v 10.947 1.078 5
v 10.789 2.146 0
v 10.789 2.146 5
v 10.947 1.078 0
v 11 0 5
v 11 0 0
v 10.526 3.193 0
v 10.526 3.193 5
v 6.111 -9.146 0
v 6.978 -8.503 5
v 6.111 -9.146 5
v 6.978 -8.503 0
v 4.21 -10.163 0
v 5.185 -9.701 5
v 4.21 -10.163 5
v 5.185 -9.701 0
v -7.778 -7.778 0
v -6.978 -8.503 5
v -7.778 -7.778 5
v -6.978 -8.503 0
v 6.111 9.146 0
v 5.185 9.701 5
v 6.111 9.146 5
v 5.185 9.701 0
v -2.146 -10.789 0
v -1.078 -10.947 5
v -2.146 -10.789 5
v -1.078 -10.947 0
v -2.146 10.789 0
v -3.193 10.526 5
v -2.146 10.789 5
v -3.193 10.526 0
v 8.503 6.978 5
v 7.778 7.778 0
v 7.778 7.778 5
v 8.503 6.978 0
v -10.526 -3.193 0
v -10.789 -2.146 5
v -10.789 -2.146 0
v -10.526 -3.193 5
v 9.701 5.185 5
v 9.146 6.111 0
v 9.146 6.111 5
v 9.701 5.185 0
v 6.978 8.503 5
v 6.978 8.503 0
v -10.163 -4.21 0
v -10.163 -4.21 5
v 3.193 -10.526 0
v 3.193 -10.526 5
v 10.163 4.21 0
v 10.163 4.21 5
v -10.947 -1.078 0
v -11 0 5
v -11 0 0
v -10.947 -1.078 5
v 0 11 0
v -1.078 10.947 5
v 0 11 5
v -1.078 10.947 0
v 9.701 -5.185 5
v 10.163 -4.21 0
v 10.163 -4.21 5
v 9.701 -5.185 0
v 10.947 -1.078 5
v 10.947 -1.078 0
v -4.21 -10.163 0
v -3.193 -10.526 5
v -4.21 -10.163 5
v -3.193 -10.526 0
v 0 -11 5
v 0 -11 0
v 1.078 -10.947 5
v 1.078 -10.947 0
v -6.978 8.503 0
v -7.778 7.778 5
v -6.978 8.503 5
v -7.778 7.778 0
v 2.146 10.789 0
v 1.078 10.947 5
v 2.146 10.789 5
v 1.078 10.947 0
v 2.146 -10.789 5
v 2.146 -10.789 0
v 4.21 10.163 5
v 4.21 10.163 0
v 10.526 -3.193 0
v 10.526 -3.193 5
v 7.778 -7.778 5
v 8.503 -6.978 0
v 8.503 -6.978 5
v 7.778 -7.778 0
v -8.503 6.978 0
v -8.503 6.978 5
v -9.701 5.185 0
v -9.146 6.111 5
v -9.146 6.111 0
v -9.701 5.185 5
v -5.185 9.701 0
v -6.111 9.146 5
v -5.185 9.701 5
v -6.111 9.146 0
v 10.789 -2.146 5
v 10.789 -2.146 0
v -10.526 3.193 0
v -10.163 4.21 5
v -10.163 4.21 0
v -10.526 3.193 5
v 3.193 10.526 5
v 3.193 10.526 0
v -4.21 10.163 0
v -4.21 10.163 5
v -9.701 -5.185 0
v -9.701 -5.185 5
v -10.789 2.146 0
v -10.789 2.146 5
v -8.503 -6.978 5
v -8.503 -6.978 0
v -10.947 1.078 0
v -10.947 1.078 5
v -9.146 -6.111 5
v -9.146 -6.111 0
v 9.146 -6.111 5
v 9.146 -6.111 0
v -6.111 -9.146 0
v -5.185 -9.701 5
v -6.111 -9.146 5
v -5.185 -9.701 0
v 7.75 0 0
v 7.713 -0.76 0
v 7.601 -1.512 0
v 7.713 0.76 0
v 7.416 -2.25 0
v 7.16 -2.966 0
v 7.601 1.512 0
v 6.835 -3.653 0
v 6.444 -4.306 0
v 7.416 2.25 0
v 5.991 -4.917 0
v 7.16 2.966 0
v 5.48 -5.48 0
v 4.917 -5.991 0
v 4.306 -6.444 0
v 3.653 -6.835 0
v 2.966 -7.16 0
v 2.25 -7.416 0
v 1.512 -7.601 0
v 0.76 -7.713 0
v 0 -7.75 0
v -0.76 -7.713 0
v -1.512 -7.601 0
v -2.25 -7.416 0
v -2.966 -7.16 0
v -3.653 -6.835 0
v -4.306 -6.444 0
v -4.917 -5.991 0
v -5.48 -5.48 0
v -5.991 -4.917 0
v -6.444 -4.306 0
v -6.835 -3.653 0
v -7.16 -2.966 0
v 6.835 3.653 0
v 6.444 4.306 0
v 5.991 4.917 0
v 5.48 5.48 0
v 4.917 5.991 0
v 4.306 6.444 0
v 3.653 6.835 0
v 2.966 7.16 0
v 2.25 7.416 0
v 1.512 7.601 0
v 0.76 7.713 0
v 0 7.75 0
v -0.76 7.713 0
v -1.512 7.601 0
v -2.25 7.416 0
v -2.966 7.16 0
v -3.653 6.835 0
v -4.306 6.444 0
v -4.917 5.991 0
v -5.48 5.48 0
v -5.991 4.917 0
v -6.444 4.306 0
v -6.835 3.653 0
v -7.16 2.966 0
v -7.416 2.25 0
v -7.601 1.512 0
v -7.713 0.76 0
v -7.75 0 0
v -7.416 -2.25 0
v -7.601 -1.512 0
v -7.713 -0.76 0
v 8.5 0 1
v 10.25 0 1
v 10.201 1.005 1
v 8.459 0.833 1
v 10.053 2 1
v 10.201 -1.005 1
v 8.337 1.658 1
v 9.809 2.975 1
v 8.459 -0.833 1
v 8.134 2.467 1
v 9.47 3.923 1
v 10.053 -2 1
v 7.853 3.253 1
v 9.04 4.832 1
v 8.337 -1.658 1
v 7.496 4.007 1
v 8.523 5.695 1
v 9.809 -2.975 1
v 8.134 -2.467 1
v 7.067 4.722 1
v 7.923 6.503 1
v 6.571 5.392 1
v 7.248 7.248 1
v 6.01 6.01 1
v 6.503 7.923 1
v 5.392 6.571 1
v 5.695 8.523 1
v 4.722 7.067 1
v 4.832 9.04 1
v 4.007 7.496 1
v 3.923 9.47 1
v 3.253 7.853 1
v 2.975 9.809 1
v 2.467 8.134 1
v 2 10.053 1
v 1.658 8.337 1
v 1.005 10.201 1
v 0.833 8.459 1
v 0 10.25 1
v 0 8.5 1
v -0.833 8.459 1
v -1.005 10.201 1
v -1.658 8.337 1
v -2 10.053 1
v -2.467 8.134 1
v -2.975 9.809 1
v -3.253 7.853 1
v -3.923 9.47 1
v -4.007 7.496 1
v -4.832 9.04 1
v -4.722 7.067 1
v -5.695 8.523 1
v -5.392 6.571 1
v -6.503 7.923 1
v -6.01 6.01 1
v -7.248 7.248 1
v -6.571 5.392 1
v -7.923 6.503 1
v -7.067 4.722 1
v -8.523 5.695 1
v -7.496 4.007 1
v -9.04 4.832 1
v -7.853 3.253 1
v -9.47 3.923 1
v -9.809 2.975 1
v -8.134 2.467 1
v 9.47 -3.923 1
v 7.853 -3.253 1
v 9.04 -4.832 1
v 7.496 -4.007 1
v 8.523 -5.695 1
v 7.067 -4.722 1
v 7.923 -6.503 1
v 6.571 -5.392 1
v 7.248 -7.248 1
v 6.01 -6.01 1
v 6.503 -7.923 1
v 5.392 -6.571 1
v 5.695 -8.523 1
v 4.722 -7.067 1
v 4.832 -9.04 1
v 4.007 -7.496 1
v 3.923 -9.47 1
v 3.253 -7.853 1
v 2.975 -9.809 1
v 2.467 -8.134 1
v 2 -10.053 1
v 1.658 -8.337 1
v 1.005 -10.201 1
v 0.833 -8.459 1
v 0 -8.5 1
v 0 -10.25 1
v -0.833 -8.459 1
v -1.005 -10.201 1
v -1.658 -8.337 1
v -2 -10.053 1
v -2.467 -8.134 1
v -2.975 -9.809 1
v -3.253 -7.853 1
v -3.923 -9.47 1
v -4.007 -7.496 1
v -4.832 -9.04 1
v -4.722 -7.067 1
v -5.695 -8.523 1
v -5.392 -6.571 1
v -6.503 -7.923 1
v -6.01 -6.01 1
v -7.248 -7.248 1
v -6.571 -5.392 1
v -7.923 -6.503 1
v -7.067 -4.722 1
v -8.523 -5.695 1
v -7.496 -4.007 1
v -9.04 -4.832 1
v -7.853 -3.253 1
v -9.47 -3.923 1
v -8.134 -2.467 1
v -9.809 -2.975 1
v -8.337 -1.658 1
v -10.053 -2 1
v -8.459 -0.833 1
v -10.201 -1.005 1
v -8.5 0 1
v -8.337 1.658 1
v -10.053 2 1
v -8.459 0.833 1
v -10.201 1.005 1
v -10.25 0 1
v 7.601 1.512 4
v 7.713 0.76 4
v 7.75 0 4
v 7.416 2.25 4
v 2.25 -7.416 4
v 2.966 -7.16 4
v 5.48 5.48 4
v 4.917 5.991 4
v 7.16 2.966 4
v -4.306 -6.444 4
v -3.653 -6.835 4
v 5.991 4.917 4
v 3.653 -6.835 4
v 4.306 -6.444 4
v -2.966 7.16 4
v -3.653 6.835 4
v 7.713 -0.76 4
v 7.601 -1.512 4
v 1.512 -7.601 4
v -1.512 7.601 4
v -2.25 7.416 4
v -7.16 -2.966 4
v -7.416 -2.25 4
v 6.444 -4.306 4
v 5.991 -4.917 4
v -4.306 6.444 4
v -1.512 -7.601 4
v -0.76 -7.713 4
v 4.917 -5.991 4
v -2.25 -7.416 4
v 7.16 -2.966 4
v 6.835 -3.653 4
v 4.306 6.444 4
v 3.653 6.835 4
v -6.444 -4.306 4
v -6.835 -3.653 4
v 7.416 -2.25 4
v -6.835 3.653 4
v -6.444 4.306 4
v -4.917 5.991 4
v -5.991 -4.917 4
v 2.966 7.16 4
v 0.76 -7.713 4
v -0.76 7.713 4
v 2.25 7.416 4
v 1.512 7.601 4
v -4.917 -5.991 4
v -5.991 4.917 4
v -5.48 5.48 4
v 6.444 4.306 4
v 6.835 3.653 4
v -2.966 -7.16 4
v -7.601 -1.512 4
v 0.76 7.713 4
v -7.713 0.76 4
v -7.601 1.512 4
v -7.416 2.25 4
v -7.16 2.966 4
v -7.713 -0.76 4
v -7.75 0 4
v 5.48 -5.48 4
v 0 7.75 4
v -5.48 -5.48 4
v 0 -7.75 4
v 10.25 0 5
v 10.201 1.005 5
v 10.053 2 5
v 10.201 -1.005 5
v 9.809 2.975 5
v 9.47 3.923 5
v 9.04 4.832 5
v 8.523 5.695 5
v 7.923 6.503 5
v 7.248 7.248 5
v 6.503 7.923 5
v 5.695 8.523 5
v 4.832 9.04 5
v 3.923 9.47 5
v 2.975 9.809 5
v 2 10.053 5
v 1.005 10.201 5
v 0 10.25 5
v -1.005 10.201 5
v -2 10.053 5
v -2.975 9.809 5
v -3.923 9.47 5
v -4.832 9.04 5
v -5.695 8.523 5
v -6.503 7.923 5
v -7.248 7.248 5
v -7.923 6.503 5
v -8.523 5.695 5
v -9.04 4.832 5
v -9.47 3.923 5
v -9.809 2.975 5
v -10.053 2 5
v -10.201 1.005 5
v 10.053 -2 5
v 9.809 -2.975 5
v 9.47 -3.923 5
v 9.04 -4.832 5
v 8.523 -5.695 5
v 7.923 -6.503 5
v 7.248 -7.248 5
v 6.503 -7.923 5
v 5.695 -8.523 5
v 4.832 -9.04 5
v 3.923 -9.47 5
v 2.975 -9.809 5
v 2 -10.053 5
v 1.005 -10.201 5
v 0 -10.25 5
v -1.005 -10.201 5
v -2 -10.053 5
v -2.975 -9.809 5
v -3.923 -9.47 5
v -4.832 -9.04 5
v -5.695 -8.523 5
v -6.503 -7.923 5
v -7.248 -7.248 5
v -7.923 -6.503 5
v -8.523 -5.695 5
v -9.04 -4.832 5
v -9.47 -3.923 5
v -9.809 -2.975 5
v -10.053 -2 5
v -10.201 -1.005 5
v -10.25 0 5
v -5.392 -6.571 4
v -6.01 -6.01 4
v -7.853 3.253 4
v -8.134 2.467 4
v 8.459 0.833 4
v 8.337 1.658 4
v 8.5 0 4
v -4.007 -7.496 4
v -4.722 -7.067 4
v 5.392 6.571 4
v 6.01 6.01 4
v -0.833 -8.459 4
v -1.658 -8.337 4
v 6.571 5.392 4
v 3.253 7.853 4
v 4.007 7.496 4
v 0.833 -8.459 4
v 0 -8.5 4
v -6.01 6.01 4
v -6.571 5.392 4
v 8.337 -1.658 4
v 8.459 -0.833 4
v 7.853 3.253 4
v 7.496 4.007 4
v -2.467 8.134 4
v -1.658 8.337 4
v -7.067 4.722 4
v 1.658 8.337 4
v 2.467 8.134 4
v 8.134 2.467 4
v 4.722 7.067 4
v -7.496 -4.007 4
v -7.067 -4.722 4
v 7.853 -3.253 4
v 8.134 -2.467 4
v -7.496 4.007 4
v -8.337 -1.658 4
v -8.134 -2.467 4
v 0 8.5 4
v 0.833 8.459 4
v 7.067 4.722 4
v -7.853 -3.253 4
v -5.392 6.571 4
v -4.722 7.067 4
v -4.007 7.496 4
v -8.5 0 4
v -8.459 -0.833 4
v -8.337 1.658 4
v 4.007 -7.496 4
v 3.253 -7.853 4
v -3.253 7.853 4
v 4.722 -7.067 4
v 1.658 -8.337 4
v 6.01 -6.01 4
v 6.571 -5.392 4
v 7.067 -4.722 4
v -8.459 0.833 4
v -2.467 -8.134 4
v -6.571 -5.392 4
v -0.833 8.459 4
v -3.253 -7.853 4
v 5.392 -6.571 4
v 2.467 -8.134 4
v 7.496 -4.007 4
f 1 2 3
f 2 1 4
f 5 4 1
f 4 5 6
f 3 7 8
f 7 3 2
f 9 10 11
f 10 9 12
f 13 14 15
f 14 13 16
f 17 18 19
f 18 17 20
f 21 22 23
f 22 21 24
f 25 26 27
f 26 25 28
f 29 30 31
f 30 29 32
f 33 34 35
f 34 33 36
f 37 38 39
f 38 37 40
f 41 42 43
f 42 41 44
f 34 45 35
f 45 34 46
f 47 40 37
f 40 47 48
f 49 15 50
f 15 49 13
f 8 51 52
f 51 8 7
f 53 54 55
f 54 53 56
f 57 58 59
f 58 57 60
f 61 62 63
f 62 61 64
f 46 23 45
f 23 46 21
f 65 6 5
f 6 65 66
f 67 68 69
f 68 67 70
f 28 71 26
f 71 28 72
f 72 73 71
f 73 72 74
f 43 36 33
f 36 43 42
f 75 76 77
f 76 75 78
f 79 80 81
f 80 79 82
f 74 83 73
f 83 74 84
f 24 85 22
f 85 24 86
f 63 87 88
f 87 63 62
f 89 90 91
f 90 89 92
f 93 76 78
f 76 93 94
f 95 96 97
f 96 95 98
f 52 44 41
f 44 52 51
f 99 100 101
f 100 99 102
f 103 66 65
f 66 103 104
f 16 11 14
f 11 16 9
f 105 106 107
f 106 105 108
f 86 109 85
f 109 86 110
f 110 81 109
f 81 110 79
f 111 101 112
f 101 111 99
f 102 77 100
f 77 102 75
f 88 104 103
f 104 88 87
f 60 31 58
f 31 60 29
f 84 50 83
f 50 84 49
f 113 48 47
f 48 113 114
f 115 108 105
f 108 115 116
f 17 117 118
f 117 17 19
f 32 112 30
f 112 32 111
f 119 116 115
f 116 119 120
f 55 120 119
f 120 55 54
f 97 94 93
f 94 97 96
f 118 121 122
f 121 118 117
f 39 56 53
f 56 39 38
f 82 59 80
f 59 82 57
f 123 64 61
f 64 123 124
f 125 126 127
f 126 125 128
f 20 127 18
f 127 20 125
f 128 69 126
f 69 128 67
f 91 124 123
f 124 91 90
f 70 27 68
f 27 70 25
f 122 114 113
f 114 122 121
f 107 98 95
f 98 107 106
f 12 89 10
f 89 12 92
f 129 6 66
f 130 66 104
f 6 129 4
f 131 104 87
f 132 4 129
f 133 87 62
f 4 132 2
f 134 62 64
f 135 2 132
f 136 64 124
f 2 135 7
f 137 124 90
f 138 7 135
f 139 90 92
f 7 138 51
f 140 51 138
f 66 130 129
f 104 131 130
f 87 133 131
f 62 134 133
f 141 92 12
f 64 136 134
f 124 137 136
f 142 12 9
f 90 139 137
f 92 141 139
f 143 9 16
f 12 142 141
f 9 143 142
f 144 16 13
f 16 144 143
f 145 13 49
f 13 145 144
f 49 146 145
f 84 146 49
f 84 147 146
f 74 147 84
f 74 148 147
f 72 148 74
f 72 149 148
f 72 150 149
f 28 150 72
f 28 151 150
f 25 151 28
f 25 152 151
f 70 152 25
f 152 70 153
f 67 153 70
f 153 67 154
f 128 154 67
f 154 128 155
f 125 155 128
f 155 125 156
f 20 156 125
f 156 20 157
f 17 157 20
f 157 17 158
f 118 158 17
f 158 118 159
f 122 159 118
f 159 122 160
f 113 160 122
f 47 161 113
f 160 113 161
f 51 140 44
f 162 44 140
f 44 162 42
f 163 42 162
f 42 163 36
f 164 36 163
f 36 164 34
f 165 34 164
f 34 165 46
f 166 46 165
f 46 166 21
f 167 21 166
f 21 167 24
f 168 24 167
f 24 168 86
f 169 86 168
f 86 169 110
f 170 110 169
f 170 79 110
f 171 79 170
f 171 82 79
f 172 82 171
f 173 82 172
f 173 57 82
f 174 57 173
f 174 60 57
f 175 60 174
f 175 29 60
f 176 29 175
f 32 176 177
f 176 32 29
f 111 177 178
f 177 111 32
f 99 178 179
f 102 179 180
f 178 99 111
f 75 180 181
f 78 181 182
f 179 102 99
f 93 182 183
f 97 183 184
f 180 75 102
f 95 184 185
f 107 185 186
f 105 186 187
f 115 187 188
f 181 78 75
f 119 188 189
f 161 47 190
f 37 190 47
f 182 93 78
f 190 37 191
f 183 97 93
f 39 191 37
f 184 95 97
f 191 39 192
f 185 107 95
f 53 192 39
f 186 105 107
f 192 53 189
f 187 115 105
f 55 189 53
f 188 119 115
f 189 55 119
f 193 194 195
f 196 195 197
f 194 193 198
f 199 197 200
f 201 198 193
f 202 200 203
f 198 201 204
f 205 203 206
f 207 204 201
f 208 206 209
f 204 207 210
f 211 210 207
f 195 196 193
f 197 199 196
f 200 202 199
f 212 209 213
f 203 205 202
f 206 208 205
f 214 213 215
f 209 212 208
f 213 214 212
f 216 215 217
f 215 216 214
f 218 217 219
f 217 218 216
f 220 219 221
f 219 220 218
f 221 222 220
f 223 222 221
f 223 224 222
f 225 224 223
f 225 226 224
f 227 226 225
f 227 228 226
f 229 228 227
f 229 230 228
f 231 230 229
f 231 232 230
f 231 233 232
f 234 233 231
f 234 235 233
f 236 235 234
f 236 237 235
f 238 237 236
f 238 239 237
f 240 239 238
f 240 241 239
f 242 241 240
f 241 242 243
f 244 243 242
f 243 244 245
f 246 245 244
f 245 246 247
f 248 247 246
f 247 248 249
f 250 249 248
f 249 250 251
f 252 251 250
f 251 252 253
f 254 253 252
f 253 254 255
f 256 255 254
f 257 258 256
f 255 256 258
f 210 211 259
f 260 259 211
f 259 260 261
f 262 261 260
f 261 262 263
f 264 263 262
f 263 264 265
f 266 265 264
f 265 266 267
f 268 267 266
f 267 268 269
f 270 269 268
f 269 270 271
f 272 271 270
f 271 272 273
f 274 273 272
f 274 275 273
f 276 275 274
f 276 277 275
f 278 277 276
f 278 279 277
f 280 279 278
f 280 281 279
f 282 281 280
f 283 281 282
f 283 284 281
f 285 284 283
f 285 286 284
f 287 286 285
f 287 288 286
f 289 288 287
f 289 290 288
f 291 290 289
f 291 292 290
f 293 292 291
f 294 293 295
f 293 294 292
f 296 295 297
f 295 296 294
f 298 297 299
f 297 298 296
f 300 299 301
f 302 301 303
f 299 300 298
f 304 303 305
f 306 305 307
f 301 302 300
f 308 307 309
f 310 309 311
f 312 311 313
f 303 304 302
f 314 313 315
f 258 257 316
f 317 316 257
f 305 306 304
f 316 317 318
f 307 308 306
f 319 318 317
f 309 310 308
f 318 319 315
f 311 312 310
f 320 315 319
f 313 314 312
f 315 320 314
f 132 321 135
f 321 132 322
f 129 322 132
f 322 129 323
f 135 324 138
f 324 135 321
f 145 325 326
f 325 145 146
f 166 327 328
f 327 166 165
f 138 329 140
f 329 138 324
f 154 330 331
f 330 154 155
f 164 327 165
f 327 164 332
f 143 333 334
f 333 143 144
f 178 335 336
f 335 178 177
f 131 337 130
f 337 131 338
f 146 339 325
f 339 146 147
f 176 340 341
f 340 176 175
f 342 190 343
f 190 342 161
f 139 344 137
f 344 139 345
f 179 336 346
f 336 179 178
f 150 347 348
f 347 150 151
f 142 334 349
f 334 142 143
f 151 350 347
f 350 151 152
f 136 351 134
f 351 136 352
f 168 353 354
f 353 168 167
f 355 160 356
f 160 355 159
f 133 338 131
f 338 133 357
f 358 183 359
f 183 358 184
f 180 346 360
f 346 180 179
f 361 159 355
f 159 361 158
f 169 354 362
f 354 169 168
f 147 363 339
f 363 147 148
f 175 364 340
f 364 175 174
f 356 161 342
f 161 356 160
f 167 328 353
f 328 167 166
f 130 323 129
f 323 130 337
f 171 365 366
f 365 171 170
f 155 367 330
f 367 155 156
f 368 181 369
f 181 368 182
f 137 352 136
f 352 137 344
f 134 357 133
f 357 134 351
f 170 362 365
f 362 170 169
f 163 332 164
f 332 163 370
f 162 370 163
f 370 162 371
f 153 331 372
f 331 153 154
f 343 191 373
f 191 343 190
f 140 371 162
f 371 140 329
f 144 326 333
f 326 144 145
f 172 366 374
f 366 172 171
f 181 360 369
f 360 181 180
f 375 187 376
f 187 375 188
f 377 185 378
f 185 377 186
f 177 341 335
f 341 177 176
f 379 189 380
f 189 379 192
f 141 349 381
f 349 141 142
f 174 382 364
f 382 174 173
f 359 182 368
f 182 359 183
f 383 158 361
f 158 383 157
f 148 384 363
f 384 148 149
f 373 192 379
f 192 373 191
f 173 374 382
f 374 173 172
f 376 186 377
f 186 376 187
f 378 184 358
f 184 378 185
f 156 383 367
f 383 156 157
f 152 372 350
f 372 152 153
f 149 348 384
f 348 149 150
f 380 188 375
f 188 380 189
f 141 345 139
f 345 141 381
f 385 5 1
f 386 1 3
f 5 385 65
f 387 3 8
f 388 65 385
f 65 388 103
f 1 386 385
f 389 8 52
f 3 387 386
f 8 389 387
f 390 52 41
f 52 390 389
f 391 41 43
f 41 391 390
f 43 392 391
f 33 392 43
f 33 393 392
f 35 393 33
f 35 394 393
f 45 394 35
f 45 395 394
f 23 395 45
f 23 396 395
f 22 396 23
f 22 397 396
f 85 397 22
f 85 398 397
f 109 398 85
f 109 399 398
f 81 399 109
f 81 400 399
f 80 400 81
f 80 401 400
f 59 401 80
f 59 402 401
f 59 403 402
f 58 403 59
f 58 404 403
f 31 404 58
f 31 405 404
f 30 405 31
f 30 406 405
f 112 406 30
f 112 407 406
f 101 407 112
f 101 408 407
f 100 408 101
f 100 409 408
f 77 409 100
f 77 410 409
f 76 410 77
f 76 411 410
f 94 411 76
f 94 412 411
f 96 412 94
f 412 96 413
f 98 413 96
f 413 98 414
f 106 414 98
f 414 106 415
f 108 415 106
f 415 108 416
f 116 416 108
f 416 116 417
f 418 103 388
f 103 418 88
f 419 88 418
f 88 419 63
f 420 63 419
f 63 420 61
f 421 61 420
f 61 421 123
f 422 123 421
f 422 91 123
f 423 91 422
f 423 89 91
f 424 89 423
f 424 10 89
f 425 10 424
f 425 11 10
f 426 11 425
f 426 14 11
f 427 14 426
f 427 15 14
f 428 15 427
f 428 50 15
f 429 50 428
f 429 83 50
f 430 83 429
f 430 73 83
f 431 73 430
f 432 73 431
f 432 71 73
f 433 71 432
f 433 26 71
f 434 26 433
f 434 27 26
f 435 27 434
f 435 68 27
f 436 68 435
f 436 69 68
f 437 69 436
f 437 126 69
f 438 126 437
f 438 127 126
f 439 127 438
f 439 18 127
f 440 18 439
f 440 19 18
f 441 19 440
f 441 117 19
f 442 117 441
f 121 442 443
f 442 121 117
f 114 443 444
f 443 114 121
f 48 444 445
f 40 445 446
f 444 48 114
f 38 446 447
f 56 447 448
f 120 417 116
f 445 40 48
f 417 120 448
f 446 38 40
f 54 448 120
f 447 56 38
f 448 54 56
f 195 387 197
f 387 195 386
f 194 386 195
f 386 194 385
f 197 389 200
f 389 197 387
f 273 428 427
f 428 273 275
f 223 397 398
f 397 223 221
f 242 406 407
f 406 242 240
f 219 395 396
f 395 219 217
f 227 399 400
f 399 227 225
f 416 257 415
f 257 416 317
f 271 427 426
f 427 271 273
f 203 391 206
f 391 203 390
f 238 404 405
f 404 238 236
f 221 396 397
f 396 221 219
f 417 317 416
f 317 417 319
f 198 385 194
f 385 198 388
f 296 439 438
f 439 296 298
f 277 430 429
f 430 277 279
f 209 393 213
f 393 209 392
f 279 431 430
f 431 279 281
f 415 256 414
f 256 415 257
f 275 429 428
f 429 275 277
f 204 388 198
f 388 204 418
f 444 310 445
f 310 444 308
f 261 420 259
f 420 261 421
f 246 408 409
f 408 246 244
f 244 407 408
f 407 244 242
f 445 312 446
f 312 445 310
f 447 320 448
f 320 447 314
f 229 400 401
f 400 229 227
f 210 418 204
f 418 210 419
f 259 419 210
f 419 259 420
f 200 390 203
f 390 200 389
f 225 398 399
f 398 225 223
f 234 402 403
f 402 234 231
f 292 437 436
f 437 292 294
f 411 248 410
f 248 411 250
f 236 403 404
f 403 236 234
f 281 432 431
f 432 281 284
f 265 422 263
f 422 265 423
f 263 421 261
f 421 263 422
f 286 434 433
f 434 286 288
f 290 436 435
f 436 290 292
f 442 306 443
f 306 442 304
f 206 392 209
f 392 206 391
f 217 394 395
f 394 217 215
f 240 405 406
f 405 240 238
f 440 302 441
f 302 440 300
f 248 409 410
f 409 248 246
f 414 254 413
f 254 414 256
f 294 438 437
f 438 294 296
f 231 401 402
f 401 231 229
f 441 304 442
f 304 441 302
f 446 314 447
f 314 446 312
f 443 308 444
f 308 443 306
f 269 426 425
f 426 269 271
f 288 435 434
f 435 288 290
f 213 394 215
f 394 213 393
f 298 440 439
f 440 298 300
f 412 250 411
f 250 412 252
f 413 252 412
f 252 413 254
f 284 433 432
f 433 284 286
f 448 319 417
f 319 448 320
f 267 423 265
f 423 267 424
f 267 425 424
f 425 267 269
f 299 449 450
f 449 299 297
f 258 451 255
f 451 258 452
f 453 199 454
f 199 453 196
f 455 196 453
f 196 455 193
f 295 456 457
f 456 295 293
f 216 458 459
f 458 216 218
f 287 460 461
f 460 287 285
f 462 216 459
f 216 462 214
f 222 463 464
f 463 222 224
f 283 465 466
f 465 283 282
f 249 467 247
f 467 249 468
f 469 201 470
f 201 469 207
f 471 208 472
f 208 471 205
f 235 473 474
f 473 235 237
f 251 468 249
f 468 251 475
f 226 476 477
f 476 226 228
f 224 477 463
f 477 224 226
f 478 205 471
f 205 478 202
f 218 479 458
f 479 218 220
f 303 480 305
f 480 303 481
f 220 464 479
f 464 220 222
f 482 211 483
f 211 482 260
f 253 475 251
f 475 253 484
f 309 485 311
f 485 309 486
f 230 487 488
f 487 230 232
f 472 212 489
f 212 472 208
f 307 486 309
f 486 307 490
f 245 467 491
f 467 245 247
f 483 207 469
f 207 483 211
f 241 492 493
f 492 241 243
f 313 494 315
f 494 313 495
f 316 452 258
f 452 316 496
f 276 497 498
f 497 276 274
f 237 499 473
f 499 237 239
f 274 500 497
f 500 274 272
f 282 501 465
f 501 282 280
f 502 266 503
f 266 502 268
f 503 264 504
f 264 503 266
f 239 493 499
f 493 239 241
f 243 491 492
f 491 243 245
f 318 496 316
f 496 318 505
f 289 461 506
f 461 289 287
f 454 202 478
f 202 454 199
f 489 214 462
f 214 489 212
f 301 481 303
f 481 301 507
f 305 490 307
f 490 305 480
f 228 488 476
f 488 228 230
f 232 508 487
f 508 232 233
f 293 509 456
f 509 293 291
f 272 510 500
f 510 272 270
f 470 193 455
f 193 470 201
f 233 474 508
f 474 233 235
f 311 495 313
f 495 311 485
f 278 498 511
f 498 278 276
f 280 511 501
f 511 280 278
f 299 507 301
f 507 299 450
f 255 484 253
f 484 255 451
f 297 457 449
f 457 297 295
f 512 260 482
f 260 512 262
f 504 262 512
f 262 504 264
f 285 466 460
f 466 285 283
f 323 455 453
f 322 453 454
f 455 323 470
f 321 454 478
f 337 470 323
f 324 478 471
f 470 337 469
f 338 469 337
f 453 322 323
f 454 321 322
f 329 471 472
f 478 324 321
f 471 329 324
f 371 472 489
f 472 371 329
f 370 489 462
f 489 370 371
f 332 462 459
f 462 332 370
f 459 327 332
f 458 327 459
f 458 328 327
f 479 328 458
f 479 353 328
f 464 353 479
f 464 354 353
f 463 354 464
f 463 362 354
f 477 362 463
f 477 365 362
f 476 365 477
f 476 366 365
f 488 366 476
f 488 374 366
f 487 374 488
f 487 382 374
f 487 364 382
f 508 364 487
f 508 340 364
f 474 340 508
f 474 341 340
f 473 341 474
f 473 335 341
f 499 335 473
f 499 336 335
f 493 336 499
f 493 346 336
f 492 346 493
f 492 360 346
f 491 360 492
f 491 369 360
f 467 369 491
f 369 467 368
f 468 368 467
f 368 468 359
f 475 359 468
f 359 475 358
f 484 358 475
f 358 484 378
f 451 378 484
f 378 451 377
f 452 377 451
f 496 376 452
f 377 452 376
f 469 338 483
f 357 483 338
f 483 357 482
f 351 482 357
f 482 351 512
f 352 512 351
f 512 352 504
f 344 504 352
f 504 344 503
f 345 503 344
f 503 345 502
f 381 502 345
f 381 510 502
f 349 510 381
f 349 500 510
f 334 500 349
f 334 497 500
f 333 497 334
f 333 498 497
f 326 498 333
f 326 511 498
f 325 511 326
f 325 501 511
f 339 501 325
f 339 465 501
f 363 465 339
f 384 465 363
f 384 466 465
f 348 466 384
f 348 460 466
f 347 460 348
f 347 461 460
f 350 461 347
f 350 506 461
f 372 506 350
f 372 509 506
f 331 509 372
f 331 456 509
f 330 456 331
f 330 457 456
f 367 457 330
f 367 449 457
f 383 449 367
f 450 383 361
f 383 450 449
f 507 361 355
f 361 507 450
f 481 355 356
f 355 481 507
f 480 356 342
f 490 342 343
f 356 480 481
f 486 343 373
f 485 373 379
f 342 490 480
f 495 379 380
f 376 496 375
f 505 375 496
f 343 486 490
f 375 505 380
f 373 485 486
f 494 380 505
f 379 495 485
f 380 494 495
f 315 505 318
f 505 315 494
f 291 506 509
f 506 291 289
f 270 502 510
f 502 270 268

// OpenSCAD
// Generated by SolidPython 1.1.3 on 2024-03-05 17:25:11


union() {
	translate(v = [0, 0, 0.5000000000]) {
		difference() {
			cylinder($fn = 64, center = true, h = 1, r = 11.0000000000);
			cylinder($fn = 64, center = true, h = 1, r = 7.7500000000);
		}
	}
	difference() {
		translate(v = [0, 0, 3.0000000000]) {
			cylinder($fn = 64, center = true, h = 4, r = 11.0000000000);
		}
		translate(v = [0, 0, 3.0000000000]) {
			cylinder($fn = 64, center = true, h = 4, r = 10.2500000000);
		}
	}
	difference() {
		translate(v = [0, 0, 2.5000000000]) {
			cylinder($fn = 64, center = true, h = 3, r = 8.5000000000);
		}
		translate(v = [0, 0, 2.5000000000]) {
			cylinder($fn = 64, center = true, h = 3, r = 7.7500000000);
		}
	}
}
/***********************************************
*********      SolidPython code:      **********
************************************************
 
import solid
import os.path as osp
import os 

def save_model(model,base_path,base_name):
    if not osp.exists(base_path):
        os.makedirs(base_path)
    scad_path=osp.join(base_path,base_name+".scad")
    solid.scad_render_to_file(model,osp.join(scad_path))


version="v1"
base_path="./designs/plasma_racks/4mm_well_0.5inch_diam_device_"+version+"/"
base_name="single_adapter_"+version
adapter_diam=22
water_well_diam_out=20.5
water_well_diam_in=17
device_diam=15.5
water_well_height=3
adapter_height=4
floor_thickness=1

#floor
floor = solid.cylinder(r=adapter_diam/2.0, h=floor_thickness, segments=64, center = True)
floor_hole = solid.cylinder(r=device_diam/2.0, h=floor_thickness, segments=64, center = True)
floor = solid.difference()(floor,floor_hole)
floor = solid.translate([0,0,floor_thickness/2.0])(floor)


#plate wells
well = solid.cylinder(r=adapter_diam/2.0, h=adapter_height, segments=64, center = True)
well = solid.translate([0,0,adapter_height/2.0+floor_thickness])(well)
well_inner = solid.cylinder(r=water_well_diam_out/2.0, h=adapter_height, segments=64, center = True)
well_inner = solid.translate([0,0,adapter_height/2.0+floor_thickness])(well_inner)
well = solid.difference()(well,well_inner)


##water wells
water_well_out = solid.cylinder(r=water_well_diam_in/2.0, h=water_well_height, segments=64, center = True)
water_well_out = solid.translate([0,0,water_well_height/2.0+floor_thickness])(water_well_out)
water_well_in = solid.cylinder(r=device_diam/2.0, h=water_well_height, segments=64, center = True)
water_well_in = solid.translate([0,0,water_well_height/2.0+floor_thickness])(water_well_in)
water_well=solid.difference()(water_well_out,water_well_in)

adapter= solid.union()(floor,well,water_well)


save_model(adapter,base_path,base_name)
 
 
************************************************/
